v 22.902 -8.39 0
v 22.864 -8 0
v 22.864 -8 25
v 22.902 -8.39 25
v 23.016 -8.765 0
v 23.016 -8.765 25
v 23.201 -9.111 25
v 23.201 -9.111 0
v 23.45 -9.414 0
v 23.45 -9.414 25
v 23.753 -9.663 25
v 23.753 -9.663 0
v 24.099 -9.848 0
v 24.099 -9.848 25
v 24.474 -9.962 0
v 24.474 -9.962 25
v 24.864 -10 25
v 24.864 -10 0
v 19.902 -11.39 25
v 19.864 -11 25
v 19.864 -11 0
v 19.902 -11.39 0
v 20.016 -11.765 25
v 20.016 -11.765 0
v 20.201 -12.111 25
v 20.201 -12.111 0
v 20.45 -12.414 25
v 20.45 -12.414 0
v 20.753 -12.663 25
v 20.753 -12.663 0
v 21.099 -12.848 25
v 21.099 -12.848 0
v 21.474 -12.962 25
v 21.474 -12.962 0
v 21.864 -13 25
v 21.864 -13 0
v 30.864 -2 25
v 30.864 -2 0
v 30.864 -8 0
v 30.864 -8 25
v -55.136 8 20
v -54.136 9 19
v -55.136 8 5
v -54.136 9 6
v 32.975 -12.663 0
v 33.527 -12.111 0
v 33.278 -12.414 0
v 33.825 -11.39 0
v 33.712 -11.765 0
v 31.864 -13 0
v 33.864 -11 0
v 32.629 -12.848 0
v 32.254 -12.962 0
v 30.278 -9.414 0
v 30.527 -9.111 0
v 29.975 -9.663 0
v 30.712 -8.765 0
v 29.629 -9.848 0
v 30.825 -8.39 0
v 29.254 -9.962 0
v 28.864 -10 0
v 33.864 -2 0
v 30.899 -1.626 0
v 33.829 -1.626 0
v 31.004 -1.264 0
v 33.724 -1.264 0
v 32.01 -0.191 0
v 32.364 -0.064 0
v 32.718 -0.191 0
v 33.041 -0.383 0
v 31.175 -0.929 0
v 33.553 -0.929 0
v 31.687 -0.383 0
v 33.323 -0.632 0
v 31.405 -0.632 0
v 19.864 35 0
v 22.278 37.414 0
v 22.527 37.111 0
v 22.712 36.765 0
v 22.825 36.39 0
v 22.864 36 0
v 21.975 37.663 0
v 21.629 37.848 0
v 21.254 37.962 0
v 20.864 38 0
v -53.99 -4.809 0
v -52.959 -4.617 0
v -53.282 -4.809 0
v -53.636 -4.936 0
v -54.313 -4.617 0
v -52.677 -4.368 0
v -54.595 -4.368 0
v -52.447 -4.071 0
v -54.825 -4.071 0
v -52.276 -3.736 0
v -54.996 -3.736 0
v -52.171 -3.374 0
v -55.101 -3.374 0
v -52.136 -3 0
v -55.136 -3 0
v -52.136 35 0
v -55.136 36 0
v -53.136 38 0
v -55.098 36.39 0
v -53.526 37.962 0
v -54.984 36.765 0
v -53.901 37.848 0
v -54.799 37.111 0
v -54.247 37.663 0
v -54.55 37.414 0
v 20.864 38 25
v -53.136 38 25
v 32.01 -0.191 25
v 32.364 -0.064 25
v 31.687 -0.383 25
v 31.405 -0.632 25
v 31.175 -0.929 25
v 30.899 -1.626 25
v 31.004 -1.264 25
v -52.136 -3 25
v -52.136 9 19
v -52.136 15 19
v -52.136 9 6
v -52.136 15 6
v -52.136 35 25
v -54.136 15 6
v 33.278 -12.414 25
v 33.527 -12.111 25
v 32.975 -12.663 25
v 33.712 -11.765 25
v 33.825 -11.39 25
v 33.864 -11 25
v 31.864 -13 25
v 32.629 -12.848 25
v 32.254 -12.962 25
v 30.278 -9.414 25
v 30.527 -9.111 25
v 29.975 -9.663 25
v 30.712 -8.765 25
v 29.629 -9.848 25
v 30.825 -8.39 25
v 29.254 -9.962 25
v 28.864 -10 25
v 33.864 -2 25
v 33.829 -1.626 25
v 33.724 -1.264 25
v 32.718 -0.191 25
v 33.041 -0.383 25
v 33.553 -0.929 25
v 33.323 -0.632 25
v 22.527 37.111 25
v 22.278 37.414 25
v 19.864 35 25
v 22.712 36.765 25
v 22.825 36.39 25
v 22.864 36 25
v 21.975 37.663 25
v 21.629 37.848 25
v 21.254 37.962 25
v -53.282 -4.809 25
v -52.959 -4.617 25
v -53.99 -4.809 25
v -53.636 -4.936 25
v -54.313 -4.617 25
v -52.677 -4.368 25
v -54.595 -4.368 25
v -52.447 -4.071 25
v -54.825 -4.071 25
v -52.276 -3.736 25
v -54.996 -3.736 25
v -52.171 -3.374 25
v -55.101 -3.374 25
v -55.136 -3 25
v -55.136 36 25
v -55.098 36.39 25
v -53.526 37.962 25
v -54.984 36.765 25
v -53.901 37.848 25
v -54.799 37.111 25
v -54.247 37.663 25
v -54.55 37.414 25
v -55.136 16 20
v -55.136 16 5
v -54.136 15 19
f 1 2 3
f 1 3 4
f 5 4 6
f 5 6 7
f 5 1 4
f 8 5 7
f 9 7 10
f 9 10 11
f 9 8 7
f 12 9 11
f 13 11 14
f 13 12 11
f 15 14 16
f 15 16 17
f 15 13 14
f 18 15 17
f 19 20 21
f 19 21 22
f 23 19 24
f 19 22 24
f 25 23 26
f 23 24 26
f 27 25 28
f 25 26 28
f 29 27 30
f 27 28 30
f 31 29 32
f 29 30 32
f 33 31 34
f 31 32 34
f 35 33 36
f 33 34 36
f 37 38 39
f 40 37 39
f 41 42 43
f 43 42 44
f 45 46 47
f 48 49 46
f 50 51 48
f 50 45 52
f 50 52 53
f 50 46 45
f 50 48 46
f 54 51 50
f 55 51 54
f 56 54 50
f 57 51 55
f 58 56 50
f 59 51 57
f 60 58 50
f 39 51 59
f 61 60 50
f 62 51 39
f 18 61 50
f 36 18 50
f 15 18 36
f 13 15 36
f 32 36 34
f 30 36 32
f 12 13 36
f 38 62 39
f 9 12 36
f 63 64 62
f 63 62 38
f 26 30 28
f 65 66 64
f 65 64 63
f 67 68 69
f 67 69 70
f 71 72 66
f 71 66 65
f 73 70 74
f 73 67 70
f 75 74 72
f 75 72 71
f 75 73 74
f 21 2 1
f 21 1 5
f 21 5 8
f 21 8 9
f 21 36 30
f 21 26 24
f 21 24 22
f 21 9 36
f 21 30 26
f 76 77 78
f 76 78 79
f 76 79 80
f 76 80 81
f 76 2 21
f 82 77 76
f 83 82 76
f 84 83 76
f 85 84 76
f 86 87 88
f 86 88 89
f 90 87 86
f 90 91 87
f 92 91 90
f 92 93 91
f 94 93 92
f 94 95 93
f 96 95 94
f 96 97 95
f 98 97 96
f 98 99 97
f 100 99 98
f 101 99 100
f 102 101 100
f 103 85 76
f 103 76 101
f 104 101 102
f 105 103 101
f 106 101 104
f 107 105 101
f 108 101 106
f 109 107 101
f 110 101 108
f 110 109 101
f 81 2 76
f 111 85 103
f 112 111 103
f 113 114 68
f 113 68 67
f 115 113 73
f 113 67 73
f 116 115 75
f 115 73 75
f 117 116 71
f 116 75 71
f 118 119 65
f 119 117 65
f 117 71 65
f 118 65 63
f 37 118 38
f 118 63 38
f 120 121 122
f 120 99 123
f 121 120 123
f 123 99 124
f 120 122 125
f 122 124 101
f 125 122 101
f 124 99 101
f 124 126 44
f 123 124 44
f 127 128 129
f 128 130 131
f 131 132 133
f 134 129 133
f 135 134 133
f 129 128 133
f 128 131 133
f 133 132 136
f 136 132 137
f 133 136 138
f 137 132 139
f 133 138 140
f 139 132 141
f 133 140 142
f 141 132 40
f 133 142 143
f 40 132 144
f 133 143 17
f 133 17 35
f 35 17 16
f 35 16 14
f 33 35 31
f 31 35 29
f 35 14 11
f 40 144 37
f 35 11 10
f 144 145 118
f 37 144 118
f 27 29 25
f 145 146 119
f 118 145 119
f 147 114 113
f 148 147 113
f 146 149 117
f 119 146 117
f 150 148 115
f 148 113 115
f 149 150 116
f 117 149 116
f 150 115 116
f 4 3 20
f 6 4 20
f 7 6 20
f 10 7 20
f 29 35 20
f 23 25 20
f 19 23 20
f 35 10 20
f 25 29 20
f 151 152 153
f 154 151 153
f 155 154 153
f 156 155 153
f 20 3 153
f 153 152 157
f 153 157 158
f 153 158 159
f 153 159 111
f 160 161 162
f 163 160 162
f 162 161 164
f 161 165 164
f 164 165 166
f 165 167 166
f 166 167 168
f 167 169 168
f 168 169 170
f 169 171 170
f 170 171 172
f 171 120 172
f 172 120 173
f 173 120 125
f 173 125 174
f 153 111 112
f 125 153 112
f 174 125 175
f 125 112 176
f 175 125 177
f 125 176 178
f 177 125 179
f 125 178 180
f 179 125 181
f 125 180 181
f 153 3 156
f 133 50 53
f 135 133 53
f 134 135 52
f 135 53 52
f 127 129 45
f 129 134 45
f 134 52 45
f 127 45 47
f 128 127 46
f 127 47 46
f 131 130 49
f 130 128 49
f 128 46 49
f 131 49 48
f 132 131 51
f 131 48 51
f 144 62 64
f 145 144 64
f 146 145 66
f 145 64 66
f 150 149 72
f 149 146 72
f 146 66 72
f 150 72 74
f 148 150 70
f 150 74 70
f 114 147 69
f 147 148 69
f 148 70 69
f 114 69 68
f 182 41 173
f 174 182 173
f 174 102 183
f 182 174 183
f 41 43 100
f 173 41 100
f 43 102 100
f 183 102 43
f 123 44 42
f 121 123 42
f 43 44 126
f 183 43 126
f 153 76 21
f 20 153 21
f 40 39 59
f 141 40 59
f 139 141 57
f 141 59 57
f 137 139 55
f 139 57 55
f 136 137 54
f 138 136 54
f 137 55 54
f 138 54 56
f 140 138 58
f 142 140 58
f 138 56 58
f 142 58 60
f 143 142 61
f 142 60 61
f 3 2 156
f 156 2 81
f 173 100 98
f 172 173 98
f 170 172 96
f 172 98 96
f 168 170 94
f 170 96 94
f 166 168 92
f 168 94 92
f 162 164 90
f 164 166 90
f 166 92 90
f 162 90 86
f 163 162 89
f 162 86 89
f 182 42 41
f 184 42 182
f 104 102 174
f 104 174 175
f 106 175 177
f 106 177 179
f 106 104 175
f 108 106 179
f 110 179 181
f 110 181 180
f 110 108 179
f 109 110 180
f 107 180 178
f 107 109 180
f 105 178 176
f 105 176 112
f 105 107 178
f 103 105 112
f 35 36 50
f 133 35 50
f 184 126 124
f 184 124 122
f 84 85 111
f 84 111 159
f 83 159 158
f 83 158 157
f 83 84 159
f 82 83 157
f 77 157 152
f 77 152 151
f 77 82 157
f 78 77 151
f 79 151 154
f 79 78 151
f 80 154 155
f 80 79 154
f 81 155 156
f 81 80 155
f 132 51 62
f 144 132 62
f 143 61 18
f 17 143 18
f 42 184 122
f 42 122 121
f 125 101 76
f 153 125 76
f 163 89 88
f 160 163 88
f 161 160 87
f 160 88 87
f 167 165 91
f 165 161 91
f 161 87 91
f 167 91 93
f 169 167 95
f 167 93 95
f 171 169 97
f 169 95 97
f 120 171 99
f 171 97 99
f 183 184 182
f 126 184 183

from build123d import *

# Parameters (mm, degrees)
F1_DEPTH    = 25
F2_W        = 6
F2_H        = 13
F3_DEPTH    = 12.5
F4_SIZE2    = 1
F4_SIZE     = 1
F5_T1_DEPTH = 25
F5_T3_DEPTH = 35


# Not quite as in the source:
# - a fillet or chamfer that OpenCascade refuses, or shapes differently, is made with other operations: its cross-section is extruded or revolved along the edge and cut away or added


with BuildPart() as f1:
    # F0 (on Top) → F1 (new body)
    with BuildSketch(Plane.XY):
        Polygon((-55.1361331344, -5), (-52.1361331344, -5), (-52.1361331344, 35), (19.8638668656, 35), (19.8638668656, -10), (19.8638668656, -13), (30.8638668656, -13), (33.8638668656, -13), (33.8638668656, -10), (33.8638668656, 0), (30.8638668656, 0), (30.8638668656, -10), (22.8638668656, -10), (22.8638668656, 38), (-55.1361331344, 38), align=None)
    extrude(amount=F1_DEPTH)

    # F2 (on face) → F3 (cut, symmetric)
    with BuildSketch(Plane(origin=(-55.1361331344, 0, 0), x_dir=(0, -1, 0), z_dir=(-1, 0, 0))):
        with Locations((-12, 12.5)):
            Rectangle(F2_W, F2_H)
    extrude(amount=F3_DEPTH, both=True, mode=Mode.SUBTRACT)

    # F4
    f4_edges = [f1.edges().sort_by_distance(p)[0] for p in [
        (-55.136133, 12, 19),
        (-55.136133, 15, 12.5),
        (-55.136133, 9, 12.5),
        (-55.136133, 12, 6),
    ]]
    chamfer(f4_edges, length=F4_SIZE, length2=F4_SIZE2)

    # F5: fillet of radius 2 on 10 edges, made by hand

    # F5_s2 → F5_t1 (join)
    with BuildSketch(Plane.XY):
        with BuildLine():
            ThreePointArc((22.8638668656, -8), (23.4496533033, -9.4142135624), (24.8638668656, -10))
            Line((24.8638668656, -10), (22.8638668656, -10))
            Line((22.8638668656, -10), (22.8638668656, -8))
        make_face()
        with BuildLine():
            ThreePointArc((30.8638668656, -8), (30.278080428, -9.4142135624), (28.8638668656, -10))
            Line((28.8638668656, -10), (30.8638668656, -10))
            Line((30.8638668656, -10), (30.8638668656, -8))
        make_face()
    extrude(amount=F5_T1_DEPTH)

    # F5_s4 → F5_t3 (cut)
    with BuildSketch(Plane.XY.offset(-5)):
        with BuildLine():
            ThreePointArc((-55.1361331344, 36), (-54.5503466967, 37.4142135624), (-53.1361331344, 38))
            Line((-53.1361331344, 38), (-55.1361331344, 38))
            Line((-55.1361331344, 38), (-55.1361331344, 36))
        make_face()
        with BuildLine():
            ThreePointArc((20.8638668656, 38), (22.278080428, 37.4142135624), (22.8638668656, 36))
            Line((22.8638668656, 36), (22.8638668656, 38))
            Line((22.8638668656, 38), (20.8638668656, 38))
        make_face()
        with BuildLine():
            ThreePointArc((19.8638668656, -11), (20.4496533033, -12.4142135624), (21.8638668656, -13))
            Line((21.8638668656, -13), (19.8638668656, -13))
            Line((19.8638668656, -13), (19.8638668656, -11))
        make_face()
        with BuildLine():
            ThreePointArc((31.8638668656, -13), (33.278080428, -12.4142135624), (33.8638668656, -11))
            Line((33.8638668656, -11), (33.8638668656, -13))
            Line((33.8638668656, -13), (31.8638668656, -13))
        make_face()
        with BuildLine():
            ThreePointArc((33.8638668656, -2), (33.278080428, -0.5857864376), (31.8638668656, 0))
            Line((31.8638668656, 0), (33.8638668656, 0))
            Line((33.8638668656, 0), (33.8638668656, -2))
        make_face()
        with BuildLine():
            ThreePointArc((32.8638668656, 0), (31.4496533033, -0.5857864376), (30.8638668656, -2))
            Line((30.8638668656, -2), (30.8638668656, 0))
            Line((30.8638668656, 0), (32.8638668656, 0))
        make_face()
        with BuildLine():
            ThreePointArc((-55.1361331344, -3), (-54.5503466967, -4.4142135624), (-53.1361331344, -5))
            Line((-53.1361331344, -5), (-55.1361331344, -5))
            Line((-55.1361331344, -5), (-55.1361331344, -3))
        make_face()
        with BuildLine():
            ThreePointArc((-54.1361331344, -5), (-52.721919572, -4.4142135624), (-52.1361331344, -3))
            Line((-52.1361331344, -3), (-52.1361331344, -5))
            Line((-52.1361331344, -5), (-54.1361331344, -5))
        make_face()
    extrude(amount=F5_T3_DEPTH, mode=Mode.SUBTRACT)


solid = f1.part
